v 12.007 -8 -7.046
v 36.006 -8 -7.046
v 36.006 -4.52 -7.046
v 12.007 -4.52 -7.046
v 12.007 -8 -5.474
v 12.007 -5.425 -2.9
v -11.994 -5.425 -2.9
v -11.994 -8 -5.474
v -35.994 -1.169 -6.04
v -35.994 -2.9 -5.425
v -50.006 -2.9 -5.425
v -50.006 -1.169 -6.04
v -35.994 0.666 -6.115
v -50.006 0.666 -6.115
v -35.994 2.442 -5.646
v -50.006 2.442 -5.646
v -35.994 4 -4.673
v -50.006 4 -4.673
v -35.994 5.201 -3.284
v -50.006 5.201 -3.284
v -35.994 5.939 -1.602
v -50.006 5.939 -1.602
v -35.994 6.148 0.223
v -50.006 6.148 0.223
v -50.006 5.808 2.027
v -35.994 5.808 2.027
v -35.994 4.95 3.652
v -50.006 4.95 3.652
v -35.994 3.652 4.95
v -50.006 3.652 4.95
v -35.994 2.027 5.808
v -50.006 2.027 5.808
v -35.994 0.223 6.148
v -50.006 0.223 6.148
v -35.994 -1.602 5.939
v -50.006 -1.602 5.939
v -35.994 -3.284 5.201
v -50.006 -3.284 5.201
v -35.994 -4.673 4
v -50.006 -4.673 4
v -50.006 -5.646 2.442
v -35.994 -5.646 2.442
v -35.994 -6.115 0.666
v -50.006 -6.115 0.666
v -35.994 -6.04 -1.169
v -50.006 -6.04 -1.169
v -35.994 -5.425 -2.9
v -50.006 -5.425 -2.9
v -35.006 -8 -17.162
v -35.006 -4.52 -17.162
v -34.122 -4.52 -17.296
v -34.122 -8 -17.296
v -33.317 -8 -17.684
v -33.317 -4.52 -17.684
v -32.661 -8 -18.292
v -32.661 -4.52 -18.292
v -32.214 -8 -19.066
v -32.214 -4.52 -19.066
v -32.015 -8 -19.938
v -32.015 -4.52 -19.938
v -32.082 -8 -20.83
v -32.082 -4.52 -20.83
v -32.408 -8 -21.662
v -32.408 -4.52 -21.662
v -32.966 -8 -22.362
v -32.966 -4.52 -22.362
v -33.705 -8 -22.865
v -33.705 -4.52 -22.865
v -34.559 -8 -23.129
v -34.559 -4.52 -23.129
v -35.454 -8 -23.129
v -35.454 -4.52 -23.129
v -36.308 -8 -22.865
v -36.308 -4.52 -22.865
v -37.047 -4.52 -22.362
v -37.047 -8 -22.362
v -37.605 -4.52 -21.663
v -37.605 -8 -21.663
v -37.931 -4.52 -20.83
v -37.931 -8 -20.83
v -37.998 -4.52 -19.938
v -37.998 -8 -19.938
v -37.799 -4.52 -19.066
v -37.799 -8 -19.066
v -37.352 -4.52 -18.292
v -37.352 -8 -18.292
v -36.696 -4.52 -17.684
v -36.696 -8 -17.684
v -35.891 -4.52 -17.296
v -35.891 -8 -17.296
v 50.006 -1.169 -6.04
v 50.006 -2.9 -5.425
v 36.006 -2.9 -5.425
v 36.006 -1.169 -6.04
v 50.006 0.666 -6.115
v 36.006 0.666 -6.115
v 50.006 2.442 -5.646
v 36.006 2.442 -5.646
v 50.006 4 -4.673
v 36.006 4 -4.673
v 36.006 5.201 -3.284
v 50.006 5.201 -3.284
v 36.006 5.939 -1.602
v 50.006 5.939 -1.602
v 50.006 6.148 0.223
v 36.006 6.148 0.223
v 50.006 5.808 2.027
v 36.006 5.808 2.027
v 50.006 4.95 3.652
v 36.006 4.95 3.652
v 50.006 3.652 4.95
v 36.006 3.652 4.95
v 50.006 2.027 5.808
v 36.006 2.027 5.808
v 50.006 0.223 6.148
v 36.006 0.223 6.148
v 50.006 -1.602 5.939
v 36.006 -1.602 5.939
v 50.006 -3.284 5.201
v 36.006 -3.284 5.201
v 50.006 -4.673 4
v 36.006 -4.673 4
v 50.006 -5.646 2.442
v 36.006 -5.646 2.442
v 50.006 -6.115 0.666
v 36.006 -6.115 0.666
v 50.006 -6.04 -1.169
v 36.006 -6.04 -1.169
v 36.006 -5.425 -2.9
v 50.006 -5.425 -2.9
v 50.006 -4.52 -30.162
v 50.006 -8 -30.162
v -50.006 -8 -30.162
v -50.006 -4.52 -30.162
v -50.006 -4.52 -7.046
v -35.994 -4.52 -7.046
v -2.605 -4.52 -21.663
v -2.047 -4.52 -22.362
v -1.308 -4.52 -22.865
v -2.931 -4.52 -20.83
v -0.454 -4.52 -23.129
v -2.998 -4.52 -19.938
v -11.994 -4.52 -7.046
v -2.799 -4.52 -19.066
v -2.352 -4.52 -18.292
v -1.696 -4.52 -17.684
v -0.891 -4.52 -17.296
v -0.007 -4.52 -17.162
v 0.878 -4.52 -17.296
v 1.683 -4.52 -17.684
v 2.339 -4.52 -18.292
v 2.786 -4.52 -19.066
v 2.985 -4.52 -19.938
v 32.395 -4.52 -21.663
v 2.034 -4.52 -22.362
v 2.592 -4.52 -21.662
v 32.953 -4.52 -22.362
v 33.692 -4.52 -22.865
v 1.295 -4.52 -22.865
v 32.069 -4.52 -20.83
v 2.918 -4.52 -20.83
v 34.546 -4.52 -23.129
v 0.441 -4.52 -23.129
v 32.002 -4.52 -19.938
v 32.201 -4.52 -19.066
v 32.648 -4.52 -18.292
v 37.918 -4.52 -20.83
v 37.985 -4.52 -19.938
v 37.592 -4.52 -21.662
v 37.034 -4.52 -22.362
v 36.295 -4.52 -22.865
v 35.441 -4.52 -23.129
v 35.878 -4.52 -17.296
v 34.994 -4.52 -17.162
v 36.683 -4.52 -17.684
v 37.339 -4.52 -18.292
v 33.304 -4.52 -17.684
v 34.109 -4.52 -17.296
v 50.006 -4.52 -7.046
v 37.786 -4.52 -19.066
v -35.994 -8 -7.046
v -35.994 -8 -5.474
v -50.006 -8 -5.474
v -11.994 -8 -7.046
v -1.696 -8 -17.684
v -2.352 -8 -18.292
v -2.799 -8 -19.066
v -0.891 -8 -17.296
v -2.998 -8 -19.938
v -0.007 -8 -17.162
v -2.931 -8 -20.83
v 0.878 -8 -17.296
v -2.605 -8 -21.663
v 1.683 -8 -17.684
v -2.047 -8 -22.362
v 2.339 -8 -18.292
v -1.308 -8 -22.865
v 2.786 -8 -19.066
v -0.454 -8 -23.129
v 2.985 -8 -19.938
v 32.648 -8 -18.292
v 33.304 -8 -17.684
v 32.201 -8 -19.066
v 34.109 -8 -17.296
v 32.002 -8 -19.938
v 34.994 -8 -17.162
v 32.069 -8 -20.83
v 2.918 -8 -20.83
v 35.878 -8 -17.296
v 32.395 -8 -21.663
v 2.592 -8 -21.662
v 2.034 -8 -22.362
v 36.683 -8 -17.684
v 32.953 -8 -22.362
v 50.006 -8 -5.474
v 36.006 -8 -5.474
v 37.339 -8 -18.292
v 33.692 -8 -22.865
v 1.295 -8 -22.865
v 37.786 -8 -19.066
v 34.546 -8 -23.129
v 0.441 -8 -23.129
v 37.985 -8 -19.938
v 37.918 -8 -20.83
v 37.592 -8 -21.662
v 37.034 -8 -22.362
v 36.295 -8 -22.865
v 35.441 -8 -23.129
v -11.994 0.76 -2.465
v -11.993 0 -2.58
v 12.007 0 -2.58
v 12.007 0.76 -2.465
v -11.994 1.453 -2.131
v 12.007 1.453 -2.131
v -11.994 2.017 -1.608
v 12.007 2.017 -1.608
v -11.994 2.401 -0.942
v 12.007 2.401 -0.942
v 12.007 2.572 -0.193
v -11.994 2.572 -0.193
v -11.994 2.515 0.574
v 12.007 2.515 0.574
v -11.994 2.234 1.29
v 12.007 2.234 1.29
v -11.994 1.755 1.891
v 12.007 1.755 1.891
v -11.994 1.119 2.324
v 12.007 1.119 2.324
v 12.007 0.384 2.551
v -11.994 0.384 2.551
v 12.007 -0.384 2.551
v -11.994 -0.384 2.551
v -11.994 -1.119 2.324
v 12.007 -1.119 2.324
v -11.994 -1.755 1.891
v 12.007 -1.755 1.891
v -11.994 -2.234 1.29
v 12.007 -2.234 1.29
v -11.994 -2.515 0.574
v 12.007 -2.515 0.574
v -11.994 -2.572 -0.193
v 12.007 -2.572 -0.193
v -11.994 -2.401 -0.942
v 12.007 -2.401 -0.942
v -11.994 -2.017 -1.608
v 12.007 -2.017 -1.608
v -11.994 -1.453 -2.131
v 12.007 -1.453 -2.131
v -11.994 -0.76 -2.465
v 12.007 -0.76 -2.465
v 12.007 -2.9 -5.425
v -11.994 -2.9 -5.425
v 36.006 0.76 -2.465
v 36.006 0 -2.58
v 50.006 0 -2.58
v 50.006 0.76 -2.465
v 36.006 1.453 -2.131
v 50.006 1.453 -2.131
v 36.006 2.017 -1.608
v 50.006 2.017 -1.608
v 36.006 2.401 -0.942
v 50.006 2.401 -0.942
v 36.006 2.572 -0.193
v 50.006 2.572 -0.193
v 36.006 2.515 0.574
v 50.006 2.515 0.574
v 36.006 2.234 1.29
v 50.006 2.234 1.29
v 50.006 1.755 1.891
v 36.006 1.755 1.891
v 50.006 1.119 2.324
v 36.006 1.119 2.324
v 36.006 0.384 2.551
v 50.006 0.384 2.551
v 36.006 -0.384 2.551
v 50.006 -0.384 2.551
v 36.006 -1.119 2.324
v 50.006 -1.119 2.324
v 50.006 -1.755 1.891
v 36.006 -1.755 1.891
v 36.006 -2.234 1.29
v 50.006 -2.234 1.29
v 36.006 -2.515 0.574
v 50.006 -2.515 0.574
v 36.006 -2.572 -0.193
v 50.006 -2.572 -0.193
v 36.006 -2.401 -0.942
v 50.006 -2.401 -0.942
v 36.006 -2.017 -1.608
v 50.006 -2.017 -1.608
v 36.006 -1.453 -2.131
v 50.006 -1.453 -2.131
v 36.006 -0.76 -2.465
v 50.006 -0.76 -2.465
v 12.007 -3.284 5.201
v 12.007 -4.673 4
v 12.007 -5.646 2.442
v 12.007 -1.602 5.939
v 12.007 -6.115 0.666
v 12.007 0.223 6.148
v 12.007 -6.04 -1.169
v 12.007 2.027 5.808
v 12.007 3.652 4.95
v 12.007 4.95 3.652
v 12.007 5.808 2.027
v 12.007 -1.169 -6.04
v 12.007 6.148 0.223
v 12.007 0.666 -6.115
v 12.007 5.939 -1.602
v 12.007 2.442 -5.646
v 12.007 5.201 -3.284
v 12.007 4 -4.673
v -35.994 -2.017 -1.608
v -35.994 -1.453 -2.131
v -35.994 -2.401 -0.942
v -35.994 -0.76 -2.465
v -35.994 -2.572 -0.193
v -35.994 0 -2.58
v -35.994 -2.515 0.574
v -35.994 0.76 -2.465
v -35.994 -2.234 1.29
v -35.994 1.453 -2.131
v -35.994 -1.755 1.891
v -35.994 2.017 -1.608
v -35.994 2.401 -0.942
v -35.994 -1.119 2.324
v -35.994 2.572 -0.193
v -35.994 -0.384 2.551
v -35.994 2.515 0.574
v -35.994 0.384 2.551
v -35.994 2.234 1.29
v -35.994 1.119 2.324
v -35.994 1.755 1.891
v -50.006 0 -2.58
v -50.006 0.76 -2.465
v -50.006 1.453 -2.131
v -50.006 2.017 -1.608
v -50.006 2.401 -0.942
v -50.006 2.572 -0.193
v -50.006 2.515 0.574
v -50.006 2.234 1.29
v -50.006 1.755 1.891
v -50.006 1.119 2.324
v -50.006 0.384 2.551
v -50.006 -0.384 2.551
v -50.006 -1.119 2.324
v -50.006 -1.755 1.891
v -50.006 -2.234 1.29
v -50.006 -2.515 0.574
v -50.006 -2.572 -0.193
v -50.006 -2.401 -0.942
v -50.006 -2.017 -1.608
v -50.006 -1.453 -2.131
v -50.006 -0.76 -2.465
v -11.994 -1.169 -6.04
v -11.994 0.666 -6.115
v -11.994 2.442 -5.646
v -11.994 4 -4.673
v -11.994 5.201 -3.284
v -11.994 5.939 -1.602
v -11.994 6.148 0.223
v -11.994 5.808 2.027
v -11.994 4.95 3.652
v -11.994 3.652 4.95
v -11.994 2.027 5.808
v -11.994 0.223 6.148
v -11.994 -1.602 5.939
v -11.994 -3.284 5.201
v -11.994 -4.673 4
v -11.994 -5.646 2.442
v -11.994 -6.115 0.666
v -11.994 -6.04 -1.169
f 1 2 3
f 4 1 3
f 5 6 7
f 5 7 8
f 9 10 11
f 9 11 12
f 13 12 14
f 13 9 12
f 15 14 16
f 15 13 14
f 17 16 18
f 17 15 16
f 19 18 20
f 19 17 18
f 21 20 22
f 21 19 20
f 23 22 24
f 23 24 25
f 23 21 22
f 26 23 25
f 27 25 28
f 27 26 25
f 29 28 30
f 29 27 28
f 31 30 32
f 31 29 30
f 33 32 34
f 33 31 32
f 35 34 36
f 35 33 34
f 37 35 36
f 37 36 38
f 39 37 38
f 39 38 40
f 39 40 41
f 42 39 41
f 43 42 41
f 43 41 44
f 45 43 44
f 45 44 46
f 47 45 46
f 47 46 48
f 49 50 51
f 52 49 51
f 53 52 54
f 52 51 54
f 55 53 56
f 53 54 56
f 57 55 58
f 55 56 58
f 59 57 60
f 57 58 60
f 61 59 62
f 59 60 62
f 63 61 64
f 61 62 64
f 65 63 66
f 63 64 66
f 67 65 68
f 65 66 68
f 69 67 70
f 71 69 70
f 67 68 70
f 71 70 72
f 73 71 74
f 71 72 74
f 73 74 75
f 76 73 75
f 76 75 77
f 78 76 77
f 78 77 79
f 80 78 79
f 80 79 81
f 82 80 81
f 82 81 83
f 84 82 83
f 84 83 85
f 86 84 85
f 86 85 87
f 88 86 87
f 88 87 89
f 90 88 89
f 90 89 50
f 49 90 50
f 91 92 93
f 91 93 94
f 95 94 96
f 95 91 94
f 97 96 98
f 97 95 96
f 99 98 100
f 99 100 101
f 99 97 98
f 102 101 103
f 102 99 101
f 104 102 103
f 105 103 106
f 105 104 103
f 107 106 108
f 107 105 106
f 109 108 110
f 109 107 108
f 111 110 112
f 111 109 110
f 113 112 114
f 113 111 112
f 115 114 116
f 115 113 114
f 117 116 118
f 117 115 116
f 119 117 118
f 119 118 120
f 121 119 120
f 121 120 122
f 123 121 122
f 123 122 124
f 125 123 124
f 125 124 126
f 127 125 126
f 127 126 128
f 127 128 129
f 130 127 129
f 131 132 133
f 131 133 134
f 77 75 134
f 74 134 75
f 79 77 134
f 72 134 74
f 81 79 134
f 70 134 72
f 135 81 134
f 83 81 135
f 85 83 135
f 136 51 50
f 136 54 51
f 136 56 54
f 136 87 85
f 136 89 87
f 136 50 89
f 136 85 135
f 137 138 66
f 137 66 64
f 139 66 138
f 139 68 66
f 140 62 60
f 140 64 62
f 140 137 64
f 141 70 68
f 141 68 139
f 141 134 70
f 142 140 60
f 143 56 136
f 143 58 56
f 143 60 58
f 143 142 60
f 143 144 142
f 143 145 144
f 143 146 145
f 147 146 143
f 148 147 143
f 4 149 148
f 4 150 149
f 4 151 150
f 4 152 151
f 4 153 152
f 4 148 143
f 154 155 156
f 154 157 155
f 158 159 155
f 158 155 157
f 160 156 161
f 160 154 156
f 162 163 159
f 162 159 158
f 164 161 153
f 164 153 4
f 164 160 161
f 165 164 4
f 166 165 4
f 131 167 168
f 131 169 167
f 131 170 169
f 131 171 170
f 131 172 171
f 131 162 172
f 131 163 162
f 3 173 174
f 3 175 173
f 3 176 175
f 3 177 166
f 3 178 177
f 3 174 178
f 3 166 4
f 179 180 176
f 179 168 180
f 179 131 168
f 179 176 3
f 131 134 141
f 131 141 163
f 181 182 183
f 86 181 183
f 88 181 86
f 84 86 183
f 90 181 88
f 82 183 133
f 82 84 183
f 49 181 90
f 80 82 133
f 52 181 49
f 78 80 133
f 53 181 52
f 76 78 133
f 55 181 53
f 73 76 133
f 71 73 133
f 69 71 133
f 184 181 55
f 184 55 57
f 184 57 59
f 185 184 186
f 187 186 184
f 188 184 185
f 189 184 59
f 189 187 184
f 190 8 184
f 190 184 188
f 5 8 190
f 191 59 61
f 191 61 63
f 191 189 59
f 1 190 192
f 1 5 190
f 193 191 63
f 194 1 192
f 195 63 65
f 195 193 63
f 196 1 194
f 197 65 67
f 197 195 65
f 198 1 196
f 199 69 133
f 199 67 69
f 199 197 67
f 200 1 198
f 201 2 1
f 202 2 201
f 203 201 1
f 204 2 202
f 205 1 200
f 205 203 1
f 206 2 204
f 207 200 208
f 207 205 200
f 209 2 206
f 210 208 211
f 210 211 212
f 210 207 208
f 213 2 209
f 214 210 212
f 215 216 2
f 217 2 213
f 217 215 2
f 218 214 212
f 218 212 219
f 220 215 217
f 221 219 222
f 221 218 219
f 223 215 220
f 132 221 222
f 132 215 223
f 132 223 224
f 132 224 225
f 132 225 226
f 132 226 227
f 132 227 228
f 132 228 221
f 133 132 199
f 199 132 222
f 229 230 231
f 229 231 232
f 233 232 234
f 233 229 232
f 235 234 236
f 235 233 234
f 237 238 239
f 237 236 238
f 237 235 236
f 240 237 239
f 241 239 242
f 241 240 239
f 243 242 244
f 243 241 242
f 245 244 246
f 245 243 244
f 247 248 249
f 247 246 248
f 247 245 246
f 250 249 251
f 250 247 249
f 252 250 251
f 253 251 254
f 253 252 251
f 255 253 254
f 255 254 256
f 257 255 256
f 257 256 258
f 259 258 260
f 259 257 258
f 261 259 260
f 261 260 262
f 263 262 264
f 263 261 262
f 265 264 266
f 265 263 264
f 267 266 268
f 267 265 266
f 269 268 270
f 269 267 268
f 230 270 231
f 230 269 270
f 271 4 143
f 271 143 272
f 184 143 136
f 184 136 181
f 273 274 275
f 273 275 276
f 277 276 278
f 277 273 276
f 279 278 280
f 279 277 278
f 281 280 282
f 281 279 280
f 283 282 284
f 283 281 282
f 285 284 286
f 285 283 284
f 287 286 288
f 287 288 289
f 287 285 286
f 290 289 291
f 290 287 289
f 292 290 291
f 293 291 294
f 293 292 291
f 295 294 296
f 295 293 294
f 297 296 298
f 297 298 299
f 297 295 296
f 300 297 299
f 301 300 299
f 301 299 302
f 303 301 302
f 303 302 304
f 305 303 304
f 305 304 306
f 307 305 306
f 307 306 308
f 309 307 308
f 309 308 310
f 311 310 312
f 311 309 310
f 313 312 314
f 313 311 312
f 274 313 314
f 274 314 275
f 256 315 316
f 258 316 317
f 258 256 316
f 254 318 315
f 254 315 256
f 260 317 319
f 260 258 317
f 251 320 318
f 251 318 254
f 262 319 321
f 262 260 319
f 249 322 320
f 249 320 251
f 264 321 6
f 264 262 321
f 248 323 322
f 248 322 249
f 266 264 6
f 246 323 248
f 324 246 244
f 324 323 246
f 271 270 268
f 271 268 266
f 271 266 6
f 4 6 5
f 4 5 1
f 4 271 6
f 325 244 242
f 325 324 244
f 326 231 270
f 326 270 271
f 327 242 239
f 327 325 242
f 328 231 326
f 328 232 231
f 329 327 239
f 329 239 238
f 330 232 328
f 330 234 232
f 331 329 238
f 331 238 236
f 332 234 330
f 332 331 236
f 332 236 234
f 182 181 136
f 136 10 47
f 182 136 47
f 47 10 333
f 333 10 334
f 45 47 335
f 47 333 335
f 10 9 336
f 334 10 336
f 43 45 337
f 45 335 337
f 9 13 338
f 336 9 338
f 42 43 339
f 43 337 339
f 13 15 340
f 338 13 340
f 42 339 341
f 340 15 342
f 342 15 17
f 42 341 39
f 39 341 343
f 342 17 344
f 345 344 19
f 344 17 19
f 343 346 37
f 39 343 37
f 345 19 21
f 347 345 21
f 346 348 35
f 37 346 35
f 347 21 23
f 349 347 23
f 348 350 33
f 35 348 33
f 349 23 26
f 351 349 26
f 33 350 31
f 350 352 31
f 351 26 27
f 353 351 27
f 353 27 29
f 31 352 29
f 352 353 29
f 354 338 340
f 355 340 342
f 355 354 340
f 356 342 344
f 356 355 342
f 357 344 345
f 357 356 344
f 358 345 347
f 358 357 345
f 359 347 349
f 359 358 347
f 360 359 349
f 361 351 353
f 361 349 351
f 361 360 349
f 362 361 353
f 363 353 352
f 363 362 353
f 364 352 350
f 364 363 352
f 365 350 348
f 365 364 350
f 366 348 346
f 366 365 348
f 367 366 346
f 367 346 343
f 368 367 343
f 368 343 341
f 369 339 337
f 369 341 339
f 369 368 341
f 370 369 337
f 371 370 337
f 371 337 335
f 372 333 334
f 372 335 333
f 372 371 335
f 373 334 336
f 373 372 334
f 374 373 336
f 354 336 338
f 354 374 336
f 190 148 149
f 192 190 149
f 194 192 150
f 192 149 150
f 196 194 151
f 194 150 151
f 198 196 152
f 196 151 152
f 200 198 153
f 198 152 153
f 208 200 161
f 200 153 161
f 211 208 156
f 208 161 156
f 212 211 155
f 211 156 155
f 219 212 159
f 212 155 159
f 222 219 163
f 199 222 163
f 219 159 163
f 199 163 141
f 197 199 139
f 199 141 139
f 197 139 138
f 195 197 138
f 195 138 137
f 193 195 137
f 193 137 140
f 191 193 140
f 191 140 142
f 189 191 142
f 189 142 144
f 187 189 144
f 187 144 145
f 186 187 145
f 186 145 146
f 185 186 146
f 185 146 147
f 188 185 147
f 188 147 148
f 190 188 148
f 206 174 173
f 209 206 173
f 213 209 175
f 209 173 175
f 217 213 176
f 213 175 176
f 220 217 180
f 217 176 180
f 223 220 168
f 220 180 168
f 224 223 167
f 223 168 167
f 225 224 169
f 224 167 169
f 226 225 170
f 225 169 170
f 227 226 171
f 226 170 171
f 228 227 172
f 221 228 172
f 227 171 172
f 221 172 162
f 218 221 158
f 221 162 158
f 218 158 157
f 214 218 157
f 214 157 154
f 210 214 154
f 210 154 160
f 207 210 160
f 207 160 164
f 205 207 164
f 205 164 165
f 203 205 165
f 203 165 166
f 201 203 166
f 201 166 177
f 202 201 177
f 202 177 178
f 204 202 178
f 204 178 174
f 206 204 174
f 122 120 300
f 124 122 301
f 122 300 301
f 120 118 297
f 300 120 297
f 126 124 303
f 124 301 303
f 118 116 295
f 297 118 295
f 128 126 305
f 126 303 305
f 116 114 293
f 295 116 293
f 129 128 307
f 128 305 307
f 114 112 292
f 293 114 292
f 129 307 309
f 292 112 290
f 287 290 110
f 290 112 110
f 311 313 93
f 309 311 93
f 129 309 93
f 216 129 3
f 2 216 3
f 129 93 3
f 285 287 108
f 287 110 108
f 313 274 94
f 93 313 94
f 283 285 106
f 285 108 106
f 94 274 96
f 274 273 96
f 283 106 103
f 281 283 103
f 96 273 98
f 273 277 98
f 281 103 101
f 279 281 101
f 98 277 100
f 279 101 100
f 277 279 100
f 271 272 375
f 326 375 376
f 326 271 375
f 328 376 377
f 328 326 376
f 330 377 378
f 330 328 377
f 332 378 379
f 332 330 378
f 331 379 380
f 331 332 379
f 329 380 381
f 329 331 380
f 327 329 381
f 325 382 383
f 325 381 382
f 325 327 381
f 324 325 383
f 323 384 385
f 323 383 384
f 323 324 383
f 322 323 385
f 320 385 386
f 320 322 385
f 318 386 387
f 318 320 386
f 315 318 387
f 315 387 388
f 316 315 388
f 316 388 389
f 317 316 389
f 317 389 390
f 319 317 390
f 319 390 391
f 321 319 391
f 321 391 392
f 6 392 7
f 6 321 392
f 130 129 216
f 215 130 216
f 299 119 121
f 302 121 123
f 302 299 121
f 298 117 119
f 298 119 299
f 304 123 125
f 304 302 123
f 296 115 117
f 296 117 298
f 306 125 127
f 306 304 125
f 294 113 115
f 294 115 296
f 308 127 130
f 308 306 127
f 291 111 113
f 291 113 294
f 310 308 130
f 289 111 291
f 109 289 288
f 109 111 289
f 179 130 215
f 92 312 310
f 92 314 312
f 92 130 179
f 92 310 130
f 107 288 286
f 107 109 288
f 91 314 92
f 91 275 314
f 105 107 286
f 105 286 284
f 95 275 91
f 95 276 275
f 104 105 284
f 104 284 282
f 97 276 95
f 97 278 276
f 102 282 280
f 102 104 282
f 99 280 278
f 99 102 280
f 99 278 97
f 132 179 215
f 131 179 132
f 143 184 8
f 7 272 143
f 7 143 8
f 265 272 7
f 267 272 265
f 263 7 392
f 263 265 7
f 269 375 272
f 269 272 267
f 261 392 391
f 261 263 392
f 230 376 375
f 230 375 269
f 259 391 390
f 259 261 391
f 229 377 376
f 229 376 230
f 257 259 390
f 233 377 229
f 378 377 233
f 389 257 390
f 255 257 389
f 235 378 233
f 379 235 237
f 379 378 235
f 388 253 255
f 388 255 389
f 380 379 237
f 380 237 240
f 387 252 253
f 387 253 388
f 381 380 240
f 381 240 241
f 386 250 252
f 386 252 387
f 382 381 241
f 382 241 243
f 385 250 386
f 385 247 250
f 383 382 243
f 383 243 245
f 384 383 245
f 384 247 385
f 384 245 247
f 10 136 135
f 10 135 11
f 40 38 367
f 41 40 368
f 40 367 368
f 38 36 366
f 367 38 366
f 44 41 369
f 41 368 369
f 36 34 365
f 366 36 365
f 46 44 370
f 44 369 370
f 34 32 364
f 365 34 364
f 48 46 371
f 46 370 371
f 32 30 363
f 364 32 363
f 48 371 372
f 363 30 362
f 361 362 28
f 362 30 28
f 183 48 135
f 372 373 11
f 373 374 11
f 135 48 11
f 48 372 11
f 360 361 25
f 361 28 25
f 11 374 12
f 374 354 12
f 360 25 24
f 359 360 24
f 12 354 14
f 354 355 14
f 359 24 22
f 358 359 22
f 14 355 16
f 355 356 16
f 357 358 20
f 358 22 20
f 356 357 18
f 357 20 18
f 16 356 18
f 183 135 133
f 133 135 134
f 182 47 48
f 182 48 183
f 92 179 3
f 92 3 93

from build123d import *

# Parameters (mm, degrees)
SKETCH3_R          = 2.5796875
RIGHT_LEAF_DEPTH   = 50.0065
SKETCH11_R         = 3
CUT_EXTRUDE1_DEPTH = 10
CUT_EXTRUDE2_DEPTH = 24
CUT_EXTRUDE5_DEPTH = 24


with BuildPart() as part:
    # Sketch3 → Right Leaf (new, symmetric)
    with BuildSketch(Plane(origin=(0, 0, 0), x_dir=(0, 0, -1), z_dir=(1, 0, 0))):
        with BuildLine():
            Line((5.474302966, -8), (30.1625, -8))
            Line((30.1625, -8), (30.1625, -4.5202))
            Line((30.1625, -4.5202), (7.045897034, -4.5202))
            Line((7.045897034, -4.5202), (5.425308633, -2.899611599))
            ThreePointArc((5.425308633, -2.899611599), (-4.349811559, 4.349811559), (2.899611599, -5.425308633))
            Line((2.899611599, -5.425308633), (5.474302966, -8))
        make_face()
        Circle(SKETCH3_R, mode=Mode.SUBTRACT)
    extrude(amount=RIGHT_LEAF_DEPTH, both=True)

    # Sketch11 → Cut-Extrude1 (cut)
    with BuildSketch(Plane(origin=(0, -4.5202, 0), x_dir=(1, 0, 0), z_dir=(0, 1, 0))):
        with Locations(Location((-35.0065, 20.1625, 0), (0, 0, 270))):
            Circle(SKETCH11_R)
        with Locations(Location((-0.0065, 20.1625, 0), (0, 0, 270))):
            Circle(SKETCH11_R)
        with Locations(Location((34.9935, 20.1625, 0), (0, 0, 270))):
            Circle(SKETCH11_R)
    extrude(amount=-CUT_EXTRUDE1_DEPTH, mode=Mode.SUBTRACT)

    # Sketch12 → Cut-Extrude2 (cut)
    with BuildSketch(Plane(origin=(36.0065, 0, 0), x_dir=(0, 0, -1), z_dir=(1, 0, 0))):
        with BuildLine():
            Line((2.899611599, -5.425308633), (5.474302966, -8))
            Line((5.474302966, -8), (7.045897034, -8))
            Line((7.045897034, -8), (7.045897034, -4.5202))
            Line((7.045897034, -4.5202), (5.425308633, -2.899611599))
            ThreePointArc((5.425308633, -2.899611599), (-4.349811559, 4.349811559), (2.899611599, -5.425308633))
        make_face()
    extrude(amount=-CUT_EXTRUDE2_DEPTH, mode=Mode.SUBTRACT)

    # Sketch14 → Cut-Extrude5 (cut)
    with BuildSketch(Plane.ZY.offset(11.9935)):
        with BuildLine():
            Line((-5.425308633, -2.899611599), (-7.045897034, -4.5202))
            Line((-7.045897034, -4.5202), (-7.045897034, -8))
            Line((-7.045897034, -8), (-5.474302966, -8))
            Line((-5.474302966, -8), (-2.899611599, -5.425308633))
            ThreePointArc((-2.899611599, -5.425308633), (4.349811559, 4.349811559), (-5.425308633, -2.899611599))
        make_face()
    extrude(amount=CUT_EXTRUDE5_DEPTH, mode=Mode.SUBTRACT)


solid = part.part
